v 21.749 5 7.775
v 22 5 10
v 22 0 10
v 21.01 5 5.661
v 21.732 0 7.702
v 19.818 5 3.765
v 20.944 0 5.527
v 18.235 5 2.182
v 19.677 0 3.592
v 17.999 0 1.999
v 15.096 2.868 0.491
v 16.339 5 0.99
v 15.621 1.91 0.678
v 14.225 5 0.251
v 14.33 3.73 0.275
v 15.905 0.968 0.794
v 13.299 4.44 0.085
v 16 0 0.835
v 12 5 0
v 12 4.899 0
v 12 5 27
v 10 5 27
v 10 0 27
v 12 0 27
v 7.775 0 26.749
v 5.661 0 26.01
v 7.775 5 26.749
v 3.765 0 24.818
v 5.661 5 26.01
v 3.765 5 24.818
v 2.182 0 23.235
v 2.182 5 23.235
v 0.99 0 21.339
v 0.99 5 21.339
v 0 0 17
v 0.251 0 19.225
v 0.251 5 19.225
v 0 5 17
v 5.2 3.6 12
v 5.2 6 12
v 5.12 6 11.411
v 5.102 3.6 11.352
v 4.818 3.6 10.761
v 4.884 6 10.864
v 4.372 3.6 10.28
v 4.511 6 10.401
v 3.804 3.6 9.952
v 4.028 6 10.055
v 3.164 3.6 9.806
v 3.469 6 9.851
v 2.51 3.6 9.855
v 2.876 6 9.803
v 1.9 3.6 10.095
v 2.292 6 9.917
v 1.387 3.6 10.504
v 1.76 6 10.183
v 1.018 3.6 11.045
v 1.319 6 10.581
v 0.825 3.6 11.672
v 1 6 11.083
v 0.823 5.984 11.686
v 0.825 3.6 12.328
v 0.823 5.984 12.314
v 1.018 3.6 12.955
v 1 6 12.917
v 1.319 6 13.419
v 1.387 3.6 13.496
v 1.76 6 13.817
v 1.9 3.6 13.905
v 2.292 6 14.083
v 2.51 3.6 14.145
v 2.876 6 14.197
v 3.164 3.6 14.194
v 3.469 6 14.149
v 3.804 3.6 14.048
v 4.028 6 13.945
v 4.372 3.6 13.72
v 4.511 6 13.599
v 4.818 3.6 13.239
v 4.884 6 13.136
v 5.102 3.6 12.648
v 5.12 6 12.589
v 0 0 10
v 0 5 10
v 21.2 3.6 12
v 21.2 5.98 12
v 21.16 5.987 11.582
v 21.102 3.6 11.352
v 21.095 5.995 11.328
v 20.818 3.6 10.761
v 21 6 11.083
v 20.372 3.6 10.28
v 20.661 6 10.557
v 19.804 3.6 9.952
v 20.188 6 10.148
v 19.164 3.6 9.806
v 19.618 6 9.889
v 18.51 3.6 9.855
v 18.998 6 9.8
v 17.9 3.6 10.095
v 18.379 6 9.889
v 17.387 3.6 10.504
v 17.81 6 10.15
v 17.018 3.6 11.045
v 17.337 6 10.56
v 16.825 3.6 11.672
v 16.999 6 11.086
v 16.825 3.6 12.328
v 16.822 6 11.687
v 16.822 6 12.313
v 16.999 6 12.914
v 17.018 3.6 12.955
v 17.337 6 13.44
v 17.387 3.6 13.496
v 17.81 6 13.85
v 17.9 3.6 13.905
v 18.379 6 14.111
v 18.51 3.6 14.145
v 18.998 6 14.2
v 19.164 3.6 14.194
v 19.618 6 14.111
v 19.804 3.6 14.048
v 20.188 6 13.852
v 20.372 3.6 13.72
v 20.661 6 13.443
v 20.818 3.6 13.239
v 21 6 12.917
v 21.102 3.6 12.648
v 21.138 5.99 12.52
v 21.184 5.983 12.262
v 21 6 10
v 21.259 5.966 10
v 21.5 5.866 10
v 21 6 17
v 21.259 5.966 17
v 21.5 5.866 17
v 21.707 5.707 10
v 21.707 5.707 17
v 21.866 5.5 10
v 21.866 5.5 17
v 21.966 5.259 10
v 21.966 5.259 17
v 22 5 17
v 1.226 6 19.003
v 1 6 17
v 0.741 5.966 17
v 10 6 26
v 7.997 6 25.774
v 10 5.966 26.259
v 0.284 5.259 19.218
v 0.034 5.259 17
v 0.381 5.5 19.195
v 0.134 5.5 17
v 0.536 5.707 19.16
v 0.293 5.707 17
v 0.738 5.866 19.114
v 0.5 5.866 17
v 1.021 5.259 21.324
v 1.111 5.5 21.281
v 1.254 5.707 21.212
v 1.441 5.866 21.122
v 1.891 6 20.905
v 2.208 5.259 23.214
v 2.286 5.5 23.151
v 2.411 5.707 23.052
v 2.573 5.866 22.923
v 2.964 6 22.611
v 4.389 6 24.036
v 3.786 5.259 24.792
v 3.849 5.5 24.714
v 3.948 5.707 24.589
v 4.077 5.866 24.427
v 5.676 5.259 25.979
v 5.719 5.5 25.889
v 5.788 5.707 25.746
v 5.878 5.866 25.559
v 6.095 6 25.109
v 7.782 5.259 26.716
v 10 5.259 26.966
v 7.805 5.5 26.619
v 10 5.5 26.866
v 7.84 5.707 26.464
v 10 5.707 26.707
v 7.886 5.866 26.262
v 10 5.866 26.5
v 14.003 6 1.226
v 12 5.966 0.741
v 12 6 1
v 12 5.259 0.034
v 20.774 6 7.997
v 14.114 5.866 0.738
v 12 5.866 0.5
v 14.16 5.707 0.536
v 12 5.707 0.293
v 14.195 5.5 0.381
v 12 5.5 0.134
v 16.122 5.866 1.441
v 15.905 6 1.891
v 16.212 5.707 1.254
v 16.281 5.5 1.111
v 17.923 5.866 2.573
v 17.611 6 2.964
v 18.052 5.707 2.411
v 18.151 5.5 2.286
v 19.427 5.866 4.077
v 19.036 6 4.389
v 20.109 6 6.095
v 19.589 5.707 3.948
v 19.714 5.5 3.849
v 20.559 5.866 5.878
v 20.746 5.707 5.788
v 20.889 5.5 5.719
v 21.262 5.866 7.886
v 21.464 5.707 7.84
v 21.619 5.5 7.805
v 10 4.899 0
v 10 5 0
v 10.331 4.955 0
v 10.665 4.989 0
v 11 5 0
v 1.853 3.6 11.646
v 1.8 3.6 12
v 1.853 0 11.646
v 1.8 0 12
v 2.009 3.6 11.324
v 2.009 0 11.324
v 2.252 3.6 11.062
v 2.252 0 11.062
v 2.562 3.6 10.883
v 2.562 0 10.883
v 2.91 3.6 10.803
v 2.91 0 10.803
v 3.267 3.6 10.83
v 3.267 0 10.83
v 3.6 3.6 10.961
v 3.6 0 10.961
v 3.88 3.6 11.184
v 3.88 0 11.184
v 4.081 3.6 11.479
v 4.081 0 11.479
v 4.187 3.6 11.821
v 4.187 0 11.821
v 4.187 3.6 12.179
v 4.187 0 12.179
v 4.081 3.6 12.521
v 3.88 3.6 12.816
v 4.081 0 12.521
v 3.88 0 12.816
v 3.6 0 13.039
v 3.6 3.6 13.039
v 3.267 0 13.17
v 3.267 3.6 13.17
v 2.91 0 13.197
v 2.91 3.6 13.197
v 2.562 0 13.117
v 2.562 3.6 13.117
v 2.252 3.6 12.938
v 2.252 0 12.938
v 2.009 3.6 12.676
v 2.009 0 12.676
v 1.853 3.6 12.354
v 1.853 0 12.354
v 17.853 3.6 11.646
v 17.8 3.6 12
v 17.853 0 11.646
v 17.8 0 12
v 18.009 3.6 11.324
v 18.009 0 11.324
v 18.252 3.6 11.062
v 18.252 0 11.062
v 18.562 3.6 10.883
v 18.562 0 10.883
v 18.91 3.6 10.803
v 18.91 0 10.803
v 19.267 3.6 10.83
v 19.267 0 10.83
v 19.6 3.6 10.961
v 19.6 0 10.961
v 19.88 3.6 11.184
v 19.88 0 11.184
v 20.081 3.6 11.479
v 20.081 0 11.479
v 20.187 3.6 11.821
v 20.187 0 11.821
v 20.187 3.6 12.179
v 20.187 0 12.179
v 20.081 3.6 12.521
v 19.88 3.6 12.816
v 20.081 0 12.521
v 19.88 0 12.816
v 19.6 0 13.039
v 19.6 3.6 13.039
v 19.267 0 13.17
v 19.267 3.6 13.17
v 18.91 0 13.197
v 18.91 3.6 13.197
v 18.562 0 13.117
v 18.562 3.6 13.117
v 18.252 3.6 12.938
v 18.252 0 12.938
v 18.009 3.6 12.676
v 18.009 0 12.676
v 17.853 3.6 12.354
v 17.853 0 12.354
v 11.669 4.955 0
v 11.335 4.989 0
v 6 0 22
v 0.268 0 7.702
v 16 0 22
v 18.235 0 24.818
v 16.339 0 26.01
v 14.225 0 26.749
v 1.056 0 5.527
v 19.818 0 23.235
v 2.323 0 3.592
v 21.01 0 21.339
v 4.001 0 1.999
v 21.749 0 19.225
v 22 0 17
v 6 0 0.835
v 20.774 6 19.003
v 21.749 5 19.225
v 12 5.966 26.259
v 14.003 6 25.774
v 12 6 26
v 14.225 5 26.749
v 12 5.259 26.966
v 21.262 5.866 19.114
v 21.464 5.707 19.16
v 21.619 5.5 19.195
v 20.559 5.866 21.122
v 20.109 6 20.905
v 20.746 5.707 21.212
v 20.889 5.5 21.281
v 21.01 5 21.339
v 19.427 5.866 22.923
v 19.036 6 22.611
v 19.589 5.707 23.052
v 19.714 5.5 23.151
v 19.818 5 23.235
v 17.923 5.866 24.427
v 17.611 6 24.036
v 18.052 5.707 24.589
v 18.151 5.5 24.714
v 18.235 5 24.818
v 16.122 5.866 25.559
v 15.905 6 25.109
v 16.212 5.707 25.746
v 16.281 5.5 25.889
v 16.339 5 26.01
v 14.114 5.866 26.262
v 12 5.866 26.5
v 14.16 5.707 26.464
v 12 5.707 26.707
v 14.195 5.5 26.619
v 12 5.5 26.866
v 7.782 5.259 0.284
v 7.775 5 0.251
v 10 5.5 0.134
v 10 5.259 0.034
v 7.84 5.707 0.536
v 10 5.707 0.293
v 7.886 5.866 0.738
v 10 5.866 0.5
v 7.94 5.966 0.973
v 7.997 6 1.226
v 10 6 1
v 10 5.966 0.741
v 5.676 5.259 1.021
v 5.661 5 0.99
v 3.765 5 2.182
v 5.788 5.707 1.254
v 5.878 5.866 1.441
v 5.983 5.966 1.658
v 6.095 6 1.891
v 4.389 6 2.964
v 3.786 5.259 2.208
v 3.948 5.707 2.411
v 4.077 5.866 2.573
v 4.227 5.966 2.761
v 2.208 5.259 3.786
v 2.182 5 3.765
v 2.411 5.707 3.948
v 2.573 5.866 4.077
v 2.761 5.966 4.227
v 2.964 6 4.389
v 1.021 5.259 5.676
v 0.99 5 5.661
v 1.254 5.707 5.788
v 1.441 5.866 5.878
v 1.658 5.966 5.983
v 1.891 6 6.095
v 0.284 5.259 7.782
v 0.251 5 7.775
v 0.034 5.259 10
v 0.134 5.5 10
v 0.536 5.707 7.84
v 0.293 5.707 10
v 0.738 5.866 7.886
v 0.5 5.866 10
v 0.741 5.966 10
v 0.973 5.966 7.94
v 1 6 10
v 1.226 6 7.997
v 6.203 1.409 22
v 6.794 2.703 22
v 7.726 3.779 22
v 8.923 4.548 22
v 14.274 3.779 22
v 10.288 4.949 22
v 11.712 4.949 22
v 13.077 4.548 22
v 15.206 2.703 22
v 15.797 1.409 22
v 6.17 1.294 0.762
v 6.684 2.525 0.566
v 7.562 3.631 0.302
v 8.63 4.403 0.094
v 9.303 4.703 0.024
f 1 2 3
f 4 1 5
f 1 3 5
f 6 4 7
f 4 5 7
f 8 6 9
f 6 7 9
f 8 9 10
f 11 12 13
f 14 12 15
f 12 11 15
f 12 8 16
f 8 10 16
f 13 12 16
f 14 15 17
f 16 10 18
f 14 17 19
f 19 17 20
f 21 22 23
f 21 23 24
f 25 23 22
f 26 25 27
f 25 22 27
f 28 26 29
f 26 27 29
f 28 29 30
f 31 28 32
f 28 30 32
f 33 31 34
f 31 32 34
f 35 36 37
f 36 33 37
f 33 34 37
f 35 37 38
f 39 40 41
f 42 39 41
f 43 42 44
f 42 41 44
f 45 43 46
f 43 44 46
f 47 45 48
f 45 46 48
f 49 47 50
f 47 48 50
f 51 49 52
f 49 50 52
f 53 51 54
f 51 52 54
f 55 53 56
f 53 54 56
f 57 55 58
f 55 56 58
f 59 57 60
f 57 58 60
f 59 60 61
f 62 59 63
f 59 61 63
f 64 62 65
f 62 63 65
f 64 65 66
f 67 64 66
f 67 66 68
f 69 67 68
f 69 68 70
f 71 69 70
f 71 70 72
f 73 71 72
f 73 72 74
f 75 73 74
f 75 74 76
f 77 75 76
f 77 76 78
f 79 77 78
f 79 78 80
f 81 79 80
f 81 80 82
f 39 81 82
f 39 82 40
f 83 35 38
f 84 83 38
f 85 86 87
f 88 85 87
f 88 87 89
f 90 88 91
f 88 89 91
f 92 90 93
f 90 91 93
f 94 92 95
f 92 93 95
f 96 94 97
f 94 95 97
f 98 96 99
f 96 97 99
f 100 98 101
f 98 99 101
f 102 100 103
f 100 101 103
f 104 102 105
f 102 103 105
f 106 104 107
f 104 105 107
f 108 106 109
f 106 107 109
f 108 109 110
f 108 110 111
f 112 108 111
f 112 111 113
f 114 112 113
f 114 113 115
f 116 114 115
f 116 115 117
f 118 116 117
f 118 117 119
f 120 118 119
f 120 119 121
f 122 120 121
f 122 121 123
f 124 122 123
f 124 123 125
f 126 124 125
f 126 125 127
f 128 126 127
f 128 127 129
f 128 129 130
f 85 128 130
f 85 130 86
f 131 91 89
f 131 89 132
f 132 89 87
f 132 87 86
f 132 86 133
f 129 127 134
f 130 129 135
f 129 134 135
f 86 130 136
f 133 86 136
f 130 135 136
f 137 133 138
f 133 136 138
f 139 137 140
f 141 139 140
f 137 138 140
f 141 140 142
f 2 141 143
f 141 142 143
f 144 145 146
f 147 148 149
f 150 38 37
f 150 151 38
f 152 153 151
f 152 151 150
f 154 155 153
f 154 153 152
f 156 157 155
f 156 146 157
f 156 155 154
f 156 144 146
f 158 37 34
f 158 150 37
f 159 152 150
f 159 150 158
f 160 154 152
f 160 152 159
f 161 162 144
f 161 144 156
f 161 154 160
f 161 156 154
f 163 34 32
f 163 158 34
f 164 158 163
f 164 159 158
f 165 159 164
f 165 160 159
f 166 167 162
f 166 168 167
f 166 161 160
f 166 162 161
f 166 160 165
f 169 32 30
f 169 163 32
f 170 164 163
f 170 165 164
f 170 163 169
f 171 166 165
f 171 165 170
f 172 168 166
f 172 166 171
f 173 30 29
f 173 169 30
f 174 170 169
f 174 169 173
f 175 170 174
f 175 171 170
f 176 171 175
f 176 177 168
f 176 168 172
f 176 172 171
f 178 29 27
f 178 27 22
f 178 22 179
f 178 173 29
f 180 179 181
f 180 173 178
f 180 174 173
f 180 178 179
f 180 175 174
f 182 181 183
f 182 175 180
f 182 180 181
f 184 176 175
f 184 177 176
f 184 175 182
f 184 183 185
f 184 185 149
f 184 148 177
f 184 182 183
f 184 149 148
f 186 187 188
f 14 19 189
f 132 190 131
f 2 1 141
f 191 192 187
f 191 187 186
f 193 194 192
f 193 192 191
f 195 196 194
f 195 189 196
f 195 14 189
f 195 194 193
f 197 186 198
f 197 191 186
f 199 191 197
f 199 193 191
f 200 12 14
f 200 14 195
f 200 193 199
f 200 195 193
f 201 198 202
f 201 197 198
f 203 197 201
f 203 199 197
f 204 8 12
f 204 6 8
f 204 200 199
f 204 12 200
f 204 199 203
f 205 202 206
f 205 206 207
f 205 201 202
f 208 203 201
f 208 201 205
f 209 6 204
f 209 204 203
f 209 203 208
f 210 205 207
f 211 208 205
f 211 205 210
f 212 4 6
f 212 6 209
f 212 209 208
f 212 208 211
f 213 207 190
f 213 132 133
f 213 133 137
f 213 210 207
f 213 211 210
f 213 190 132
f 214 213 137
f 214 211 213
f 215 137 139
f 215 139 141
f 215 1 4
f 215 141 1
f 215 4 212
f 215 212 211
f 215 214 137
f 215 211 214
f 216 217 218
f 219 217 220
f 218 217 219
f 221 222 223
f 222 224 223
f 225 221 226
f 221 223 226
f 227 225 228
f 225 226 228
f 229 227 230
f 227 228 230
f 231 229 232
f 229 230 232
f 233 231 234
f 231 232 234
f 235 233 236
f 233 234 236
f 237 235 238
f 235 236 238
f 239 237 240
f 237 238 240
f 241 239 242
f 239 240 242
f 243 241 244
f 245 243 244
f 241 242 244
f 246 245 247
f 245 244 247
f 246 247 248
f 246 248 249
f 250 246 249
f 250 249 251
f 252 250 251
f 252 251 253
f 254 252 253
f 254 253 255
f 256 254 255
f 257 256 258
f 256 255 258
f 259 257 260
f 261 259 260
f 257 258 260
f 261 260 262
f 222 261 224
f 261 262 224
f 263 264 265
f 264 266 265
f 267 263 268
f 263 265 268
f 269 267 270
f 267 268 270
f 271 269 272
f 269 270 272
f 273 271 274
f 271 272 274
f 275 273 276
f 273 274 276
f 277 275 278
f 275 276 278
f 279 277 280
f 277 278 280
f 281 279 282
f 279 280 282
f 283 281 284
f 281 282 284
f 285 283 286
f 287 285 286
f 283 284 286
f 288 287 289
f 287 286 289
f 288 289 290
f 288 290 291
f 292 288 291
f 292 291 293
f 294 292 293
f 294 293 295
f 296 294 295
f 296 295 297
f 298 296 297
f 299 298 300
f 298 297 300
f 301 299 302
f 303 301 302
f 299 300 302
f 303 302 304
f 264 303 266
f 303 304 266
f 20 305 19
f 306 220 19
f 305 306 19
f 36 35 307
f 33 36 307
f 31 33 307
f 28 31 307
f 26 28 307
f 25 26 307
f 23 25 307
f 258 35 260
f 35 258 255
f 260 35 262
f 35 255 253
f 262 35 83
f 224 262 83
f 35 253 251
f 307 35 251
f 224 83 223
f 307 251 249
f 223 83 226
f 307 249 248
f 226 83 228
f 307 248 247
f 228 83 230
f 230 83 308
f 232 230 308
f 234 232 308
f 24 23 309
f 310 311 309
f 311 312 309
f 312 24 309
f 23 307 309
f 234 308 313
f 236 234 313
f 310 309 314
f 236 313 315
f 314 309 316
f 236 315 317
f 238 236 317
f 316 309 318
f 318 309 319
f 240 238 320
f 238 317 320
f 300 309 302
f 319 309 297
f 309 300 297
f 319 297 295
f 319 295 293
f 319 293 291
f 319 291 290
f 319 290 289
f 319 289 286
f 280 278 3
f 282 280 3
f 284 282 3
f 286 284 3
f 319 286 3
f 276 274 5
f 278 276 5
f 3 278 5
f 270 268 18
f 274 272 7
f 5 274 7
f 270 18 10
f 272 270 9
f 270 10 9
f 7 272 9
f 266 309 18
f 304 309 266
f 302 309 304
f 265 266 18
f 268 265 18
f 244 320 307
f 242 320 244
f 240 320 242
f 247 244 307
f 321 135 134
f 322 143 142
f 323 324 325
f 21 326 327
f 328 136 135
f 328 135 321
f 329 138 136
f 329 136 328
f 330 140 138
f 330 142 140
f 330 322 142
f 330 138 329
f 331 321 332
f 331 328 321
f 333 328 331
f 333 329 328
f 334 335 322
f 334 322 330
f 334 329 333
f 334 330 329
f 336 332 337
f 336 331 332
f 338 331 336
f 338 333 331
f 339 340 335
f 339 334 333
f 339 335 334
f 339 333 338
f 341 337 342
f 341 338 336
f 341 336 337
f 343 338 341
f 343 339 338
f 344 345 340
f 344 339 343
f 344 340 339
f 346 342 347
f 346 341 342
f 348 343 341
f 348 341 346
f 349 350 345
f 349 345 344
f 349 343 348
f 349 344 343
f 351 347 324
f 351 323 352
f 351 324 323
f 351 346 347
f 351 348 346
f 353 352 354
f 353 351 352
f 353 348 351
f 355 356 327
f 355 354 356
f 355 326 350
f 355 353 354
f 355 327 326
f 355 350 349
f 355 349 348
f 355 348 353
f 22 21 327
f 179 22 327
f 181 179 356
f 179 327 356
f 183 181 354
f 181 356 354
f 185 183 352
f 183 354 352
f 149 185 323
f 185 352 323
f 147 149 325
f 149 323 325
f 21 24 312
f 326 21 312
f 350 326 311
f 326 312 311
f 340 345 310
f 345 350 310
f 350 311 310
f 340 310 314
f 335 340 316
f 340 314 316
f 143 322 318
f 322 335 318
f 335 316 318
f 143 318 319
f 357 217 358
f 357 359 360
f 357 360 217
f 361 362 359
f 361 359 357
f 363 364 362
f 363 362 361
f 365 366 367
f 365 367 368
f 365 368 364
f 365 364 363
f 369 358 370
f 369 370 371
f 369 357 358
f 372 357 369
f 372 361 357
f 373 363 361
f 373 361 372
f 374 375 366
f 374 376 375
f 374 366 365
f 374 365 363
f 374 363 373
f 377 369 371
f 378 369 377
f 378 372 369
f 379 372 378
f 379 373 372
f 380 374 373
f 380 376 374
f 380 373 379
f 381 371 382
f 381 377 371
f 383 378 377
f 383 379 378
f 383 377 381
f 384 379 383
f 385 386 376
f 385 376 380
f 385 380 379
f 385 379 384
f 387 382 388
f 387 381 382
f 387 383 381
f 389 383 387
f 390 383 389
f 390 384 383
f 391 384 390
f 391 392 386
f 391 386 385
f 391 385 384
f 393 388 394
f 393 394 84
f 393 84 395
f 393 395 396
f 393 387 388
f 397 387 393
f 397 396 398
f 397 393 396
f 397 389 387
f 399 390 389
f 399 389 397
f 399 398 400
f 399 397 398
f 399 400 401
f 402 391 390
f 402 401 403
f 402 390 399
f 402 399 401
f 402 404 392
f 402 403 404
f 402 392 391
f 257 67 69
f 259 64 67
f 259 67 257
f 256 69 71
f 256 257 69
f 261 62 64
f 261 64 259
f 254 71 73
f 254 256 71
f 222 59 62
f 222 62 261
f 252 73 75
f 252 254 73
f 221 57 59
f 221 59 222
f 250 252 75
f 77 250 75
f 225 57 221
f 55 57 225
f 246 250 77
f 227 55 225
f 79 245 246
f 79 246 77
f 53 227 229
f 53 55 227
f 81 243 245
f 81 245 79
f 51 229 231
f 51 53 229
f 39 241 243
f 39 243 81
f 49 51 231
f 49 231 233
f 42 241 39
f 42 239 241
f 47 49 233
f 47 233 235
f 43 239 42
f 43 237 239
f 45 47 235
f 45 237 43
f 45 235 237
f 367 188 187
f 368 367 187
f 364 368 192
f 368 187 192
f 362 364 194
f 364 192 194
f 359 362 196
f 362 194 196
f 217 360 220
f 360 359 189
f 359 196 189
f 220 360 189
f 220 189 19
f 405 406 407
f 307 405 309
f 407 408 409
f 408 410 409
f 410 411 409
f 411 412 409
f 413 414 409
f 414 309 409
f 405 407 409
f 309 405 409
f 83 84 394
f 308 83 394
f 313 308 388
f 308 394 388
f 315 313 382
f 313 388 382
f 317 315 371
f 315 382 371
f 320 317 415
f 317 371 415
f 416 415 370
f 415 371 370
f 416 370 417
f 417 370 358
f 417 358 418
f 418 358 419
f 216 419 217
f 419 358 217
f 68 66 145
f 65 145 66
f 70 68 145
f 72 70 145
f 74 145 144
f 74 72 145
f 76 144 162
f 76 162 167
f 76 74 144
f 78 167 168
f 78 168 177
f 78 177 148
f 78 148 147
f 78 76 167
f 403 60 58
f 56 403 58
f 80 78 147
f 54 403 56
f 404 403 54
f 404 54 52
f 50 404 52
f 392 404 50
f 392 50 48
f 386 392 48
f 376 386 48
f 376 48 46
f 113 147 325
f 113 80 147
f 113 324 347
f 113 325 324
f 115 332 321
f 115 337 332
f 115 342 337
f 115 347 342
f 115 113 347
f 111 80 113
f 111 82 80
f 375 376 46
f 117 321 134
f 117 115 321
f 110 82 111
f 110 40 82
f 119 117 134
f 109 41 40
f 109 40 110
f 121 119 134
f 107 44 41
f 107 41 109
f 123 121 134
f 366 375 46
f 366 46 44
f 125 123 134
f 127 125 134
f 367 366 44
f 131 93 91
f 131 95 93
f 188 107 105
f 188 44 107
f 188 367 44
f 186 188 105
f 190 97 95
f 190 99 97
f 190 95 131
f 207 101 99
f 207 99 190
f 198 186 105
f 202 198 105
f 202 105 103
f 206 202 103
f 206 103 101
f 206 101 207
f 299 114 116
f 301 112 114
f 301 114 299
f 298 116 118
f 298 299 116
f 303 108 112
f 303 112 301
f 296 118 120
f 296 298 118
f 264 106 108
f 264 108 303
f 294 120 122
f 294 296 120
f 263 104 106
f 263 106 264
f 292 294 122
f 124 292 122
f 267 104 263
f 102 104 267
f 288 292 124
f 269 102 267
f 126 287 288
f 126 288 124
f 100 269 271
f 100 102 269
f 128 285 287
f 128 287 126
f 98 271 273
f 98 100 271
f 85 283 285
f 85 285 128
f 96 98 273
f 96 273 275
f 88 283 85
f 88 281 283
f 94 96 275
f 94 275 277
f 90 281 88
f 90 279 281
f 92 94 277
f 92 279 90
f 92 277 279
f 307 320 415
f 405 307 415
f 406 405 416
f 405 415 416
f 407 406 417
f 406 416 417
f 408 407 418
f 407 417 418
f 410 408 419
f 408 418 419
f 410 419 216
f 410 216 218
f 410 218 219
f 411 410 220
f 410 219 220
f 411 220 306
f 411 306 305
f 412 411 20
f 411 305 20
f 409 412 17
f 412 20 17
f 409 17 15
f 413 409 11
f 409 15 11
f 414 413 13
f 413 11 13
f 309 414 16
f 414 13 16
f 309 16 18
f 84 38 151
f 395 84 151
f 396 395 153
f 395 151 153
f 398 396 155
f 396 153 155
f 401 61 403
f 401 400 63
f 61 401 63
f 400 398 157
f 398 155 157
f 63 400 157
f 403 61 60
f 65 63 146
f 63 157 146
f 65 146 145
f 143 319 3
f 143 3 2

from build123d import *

# Parameters (mm, degrees)
BOSS_EXTRU_1_DEPTH                                 = 22
ESQUISSE2_W                                        = 22
ESQUISSE2_H                                        = 6
BOSS_EXTRU_2_DEPTH                                 = 5
CHAMBRAGE_POUR_VIS_T_TE_HEXAGONALE_M21_D           = 2.4
CHAMBRAGE_POUR_VIS_T_TE_HEXAGONALE_M21_CBORE_D     = 4.4
CHAMBRAGE_POUR_VIS_T_TE_HEXAGONALE_M21_CBORE_DEPTH = 2.4
CONG_1_R                                           = 10
CONG_2_R                                           = 1


with BuildPart() as part:
    # Esquisse1 → Boss.-Extru.1 (new body)
    with BuildSketch(Plane.XY):
        with BuildLine():
            Line((0, 6), (0, 0))
            Line((0, 0), (6, 0))
            ThreePointArc((6, 0), (11, 5), (16, 0))
            Line((16, 0), (22, 0))
            Line((22, 0), (22, 6))
            Line((22, 6), (0, 6))
        make_face()
    extrude(amount=BOSS_EXTRU_1_DEPTH)

    # Esquisse2 → Boss.-Extru.2 (add)
    with BuildSketch(Plane.XY.offset(22)):
        with Locations((11, 3)):
            Rectangle(ESQUISSE2_W, ESQUISSE2_H)
    extrude(amount=BOSS_EXTRU_2_DEPTH)

    # Chambrage pour vis à tête hexagonale M21 (through all)
    with Locations(Plane(origin=(0, 6, 0), x_dir=(1, 0, 0), z_dir=(0, 1, 0))):
        with Locations((19, -12), (3, -12)):
            CounterBoreHole(CHAMBRAGE_POUR_VIS_T_TE_HEXAGONALE_M21_D / 2, CHAMBRAGE_POUR_VIS_T_TE_HEXAGONALE_M21_CBORE_D / 2, CHAMBRAGE_POUR_VIS_T_TE_HEXAGONALE_M21_CBORE_DEPTH)

    # Congé1
    # the kernel refuses this fillet: 10 mm, written as the material it takes off along each edge
    with BuildSketch(Plane(origin=(0, 31, 0), x_dir=(0, 0, 1), z_dir=(0, -1, 0)), Plane(origin=(22, -25, 27), x_dir=(-1, 0, 0), z_dir=(0, 1, 0))) as cong_1_piece_1:
        with BuildLine():
            CenterArc((CONG_1_R, -CONG_1_R), CONG_1_R, 90, 90)
            Line((0, -CONG_1_R), (0, 0))
            Line((0, 0), (CONG_1_R, 0))
        make_face()
    extrude(amount=56, mode=Mode.SUBTRACT)
    with BuildSketch(Plane(origin=(0, 31, 27), x_dir=(0, 0, -1), z_dir=(0, -1, 0)), Plane(origin=(22, -25, 0), x_dir=(-1, 0, 0), z_dir=(0, 1, 0))) as cong_1_piece_2:
        with BuildLine():
            CenterArc((CONG_1_R, CONG_1_R), CONG_1_R, 180, 90)
            Line((0, CONG_1_R), (0, 0))
            Line((0, 0), (CONG_1_R, 0))
        make_face()
    extrude(amount=56, mode=Mode.SUBTRACT)

    # Congé2
    # the kernel refuses this fillet: 1 mm, written as the material it takes off along each edge
    with BuildSketch(Plane(origin=(12, 6, 0), x_dir=(0, 0, 1), z_dir=(-1, 0, 0))) as cong_2_piece_1:
        with BuildLine():
            CenterArc((CONG_2_R, -CONG_2_R), CONG_2_R, 90, 90)
            Line((0, -CONG_2_R), (0, 0))
            Line((0, 0), (CONG_2_R, 0))
        make_face()
    extrude(amount=2, mode=Mode.SUBTRACT)
    with BuildSketch(Plane(origin=(0, 6, 17), x_dir=(0, -1, 0), z_dir=(0, 0, -1)), Plane(origin=(22, 6, 17), x_dir=(-1, 0, 0), z_dir=(0, 0, -1))) as cong_2_piece_2:
        with BuildLine():
            CenterArc((CONG_2_R, -CONG_2_R), CONG_2_R, 90, 90)
            Line((0, -CONG_2_R), (0, 0))
            Line((0, 0), (CONG_2_R, 0))
        make_face()
    extrude(amount=7, mode=Mode.SUBTRACT)
    with BuildSketch(Plane(origin=(12, 6, 27), x_dir=(0, 0, -1), z_dir=(-1, 0, 0))) as cong_2_piece_3:
        with BuildLine():
            CenterArc((CONG_2_R, CONG_2_R), CONG_2_R, 180, 90)
            Line((0, CONG_2_R), (0, 0))
            Line((0, 0), (CONG_2_R, 0))
        make_face()
    extrude(amount=2, mode=Mode.SUBTRACT)
    with BuildSketch(Plane(origin=(12, 6, 17), x_dir=(1, 0, 0), z_dir=(0, 0, -1))) as cong_2_piece_4:
        with BuildLine():
            CenterArc((10 - CONG_2_R, CONG_2_R), CONG_2_R, 270, 90)
            Line((10, CONG_2_R), (10, 0))
            Line((10, 0), (10 - CONG_2_R, 0))
        make_face()
    revolve(axis=Axis((12, 6, 17), (0, -1, 0)), revolution_arc=90, mode=Mode.SUBTRACT)
    with BuildSketch(Plane(origin=(12, 6, 10), x_dir=(0, 0, -1), z_dir=(-1, 0, 0))) as cong_2_piece_5:
        with BuildLine():
            CenterArc((10 - CONG_2_R, CONG_2_R), CONG_2_R, 270, 90)
            Line((10, CONG_2_R), (10, 0))
            Line((10, 0), (10 - CONG_2_R, 0))
        make_face()
    revolve(axis=Axis((12, 6, 10), (0, -1, 0)), revolution_arc=90, mode=Mode.SUBTRACT)
    with BuildSketch(Plane(origin=(10, 6, 17), x_dir=(-1, 0, 0), z_dir=(0, 0, -1))) as cong_2_piece_6:
        with BuildLine():
            CenterArc((10 - CONG_2_R, -CONG_2_R), CONG_2_R, 0, 90)
            Line((10, -CONG_2_R), (10, 0))
            Line((10, 0), (10 - CONG_2_R, 0))
        make_face()
    revolve(axis=Axis((10, 6, 17), (0, 1, 0)), revolution_arc=90, mode=Mode.SUBTRACT)
    with BuildSketch(Plane(origin=(10, 6, 10), x_dir=(0, 0, -1), z_dir=(1, 0, 0))) as cong_2_piece_7:
        with BuildLine():
            CenterArc((10 - CONG_2_R, -CONG_2_R), CONG_2_R, 0, 90)
            Line((10, -CONG_2_R), (10, 0))
            Line((10, 0), (10 - CONG_2_R, 0))
        make_face()
    revolve(axis=Axis((10, 6, 10), (0, 1, 0)), revolution_arc=90, mode=Mode.SUBTRACT)


solid = part.part
